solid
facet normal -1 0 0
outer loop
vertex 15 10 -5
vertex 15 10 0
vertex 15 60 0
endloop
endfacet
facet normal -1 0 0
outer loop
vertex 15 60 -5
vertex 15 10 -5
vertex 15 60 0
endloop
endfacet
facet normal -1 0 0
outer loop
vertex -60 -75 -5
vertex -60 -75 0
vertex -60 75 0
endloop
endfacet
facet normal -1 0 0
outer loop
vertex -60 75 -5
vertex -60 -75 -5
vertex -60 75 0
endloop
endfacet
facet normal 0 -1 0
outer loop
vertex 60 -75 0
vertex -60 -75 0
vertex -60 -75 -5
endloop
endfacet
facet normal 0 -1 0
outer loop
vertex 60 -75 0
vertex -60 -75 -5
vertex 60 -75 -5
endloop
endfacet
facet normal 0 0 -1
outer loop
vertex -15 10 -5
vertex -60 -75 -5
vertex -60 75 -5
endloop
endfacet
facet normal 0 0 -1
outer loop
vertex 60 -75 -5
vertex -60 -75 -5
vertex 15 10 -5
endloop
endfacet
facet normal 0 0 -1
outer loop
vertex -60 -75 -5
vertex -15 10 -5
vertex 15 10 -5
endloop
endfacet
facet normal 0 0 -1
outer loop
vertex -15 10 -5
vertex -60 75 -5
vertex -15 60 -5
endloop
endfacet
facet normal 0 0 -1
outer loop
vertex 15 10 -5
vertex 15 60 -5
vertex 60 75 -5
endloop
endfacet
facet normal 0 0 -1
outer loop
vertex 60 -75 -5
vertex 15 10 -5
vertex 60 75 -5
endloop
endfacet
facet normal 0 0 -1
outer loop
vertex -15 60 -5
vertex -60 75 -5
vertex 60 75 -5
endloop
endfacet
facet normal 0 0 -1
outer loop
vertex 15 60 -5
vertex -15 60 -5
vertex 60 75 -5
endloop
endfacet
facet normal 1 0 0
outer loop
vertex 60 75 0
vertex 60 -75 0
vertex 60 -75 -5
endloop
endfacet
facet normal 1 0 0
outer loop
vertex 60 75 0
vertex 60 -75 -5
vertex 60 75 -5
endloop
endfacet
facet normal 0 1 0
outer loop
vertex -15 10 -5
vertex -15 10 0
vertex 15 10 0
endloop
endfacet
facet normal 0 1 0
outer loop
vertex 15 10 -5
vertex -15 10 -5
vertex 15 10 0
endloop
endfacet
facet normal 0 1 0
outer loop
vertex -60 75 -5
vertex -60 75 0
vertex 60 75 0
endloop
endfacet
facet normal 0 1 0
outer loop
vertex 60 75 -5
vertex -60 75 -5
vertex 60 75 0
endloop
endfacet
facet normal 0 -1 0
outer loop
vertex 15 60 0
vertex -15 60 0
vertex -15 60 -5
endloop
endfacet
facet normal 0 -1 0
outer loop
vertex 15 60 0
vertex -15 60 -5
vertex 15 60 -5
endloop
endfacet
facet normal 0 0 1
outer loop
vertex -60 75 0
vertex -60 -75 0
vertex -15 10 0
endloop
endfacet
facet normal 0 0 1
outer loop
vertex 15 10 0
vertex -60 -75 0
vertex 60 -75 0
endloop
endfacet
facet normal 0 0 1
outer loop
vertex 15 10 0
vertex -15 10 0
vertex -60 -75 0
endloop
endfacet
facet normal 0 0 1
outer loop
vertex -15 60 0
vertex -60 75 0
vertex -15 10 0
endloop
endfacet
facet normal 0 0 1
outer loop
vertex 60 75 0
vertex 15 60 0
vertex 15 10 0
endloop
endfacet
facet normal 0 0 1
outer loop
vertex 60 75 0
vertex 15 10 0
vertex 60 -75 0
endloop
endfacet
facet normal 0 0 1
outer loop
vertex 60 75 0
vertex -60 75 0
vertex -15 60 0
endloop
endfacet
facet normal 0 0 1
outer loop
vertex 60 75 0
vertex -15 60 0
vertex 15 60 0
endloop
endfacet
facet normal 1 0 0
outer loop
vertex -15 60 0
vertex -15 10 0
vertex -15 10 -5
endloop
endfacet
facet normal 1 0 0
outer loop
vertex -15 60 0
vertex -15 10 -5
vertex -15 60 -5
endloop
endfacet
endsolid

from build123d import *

# Parameters (mm, degrees)
SKETCH1_W           = 120
SKETCH1_H           = 150
SKETCH1_W_2         = 30
SKETCH1_H_2         = 50
BOSS_EXTRUDE1_DEPTH = 5


with BuildPart() as part:
    # Sketch1 → Boss-Extrude1 (new body)
    with BuildSketch(Plane.XY):
        Rectangle(SKETCH1_W, SKETCH1_H)
        with Locations((0, 35)):
            Rectangle(SKETCH1_W_2, SKETCH1_H_2, mode=Mode.SUBTRACT)
    extrude(amount=-BOSS_EXTRUDE1_DEPTH)


solid = part.part
